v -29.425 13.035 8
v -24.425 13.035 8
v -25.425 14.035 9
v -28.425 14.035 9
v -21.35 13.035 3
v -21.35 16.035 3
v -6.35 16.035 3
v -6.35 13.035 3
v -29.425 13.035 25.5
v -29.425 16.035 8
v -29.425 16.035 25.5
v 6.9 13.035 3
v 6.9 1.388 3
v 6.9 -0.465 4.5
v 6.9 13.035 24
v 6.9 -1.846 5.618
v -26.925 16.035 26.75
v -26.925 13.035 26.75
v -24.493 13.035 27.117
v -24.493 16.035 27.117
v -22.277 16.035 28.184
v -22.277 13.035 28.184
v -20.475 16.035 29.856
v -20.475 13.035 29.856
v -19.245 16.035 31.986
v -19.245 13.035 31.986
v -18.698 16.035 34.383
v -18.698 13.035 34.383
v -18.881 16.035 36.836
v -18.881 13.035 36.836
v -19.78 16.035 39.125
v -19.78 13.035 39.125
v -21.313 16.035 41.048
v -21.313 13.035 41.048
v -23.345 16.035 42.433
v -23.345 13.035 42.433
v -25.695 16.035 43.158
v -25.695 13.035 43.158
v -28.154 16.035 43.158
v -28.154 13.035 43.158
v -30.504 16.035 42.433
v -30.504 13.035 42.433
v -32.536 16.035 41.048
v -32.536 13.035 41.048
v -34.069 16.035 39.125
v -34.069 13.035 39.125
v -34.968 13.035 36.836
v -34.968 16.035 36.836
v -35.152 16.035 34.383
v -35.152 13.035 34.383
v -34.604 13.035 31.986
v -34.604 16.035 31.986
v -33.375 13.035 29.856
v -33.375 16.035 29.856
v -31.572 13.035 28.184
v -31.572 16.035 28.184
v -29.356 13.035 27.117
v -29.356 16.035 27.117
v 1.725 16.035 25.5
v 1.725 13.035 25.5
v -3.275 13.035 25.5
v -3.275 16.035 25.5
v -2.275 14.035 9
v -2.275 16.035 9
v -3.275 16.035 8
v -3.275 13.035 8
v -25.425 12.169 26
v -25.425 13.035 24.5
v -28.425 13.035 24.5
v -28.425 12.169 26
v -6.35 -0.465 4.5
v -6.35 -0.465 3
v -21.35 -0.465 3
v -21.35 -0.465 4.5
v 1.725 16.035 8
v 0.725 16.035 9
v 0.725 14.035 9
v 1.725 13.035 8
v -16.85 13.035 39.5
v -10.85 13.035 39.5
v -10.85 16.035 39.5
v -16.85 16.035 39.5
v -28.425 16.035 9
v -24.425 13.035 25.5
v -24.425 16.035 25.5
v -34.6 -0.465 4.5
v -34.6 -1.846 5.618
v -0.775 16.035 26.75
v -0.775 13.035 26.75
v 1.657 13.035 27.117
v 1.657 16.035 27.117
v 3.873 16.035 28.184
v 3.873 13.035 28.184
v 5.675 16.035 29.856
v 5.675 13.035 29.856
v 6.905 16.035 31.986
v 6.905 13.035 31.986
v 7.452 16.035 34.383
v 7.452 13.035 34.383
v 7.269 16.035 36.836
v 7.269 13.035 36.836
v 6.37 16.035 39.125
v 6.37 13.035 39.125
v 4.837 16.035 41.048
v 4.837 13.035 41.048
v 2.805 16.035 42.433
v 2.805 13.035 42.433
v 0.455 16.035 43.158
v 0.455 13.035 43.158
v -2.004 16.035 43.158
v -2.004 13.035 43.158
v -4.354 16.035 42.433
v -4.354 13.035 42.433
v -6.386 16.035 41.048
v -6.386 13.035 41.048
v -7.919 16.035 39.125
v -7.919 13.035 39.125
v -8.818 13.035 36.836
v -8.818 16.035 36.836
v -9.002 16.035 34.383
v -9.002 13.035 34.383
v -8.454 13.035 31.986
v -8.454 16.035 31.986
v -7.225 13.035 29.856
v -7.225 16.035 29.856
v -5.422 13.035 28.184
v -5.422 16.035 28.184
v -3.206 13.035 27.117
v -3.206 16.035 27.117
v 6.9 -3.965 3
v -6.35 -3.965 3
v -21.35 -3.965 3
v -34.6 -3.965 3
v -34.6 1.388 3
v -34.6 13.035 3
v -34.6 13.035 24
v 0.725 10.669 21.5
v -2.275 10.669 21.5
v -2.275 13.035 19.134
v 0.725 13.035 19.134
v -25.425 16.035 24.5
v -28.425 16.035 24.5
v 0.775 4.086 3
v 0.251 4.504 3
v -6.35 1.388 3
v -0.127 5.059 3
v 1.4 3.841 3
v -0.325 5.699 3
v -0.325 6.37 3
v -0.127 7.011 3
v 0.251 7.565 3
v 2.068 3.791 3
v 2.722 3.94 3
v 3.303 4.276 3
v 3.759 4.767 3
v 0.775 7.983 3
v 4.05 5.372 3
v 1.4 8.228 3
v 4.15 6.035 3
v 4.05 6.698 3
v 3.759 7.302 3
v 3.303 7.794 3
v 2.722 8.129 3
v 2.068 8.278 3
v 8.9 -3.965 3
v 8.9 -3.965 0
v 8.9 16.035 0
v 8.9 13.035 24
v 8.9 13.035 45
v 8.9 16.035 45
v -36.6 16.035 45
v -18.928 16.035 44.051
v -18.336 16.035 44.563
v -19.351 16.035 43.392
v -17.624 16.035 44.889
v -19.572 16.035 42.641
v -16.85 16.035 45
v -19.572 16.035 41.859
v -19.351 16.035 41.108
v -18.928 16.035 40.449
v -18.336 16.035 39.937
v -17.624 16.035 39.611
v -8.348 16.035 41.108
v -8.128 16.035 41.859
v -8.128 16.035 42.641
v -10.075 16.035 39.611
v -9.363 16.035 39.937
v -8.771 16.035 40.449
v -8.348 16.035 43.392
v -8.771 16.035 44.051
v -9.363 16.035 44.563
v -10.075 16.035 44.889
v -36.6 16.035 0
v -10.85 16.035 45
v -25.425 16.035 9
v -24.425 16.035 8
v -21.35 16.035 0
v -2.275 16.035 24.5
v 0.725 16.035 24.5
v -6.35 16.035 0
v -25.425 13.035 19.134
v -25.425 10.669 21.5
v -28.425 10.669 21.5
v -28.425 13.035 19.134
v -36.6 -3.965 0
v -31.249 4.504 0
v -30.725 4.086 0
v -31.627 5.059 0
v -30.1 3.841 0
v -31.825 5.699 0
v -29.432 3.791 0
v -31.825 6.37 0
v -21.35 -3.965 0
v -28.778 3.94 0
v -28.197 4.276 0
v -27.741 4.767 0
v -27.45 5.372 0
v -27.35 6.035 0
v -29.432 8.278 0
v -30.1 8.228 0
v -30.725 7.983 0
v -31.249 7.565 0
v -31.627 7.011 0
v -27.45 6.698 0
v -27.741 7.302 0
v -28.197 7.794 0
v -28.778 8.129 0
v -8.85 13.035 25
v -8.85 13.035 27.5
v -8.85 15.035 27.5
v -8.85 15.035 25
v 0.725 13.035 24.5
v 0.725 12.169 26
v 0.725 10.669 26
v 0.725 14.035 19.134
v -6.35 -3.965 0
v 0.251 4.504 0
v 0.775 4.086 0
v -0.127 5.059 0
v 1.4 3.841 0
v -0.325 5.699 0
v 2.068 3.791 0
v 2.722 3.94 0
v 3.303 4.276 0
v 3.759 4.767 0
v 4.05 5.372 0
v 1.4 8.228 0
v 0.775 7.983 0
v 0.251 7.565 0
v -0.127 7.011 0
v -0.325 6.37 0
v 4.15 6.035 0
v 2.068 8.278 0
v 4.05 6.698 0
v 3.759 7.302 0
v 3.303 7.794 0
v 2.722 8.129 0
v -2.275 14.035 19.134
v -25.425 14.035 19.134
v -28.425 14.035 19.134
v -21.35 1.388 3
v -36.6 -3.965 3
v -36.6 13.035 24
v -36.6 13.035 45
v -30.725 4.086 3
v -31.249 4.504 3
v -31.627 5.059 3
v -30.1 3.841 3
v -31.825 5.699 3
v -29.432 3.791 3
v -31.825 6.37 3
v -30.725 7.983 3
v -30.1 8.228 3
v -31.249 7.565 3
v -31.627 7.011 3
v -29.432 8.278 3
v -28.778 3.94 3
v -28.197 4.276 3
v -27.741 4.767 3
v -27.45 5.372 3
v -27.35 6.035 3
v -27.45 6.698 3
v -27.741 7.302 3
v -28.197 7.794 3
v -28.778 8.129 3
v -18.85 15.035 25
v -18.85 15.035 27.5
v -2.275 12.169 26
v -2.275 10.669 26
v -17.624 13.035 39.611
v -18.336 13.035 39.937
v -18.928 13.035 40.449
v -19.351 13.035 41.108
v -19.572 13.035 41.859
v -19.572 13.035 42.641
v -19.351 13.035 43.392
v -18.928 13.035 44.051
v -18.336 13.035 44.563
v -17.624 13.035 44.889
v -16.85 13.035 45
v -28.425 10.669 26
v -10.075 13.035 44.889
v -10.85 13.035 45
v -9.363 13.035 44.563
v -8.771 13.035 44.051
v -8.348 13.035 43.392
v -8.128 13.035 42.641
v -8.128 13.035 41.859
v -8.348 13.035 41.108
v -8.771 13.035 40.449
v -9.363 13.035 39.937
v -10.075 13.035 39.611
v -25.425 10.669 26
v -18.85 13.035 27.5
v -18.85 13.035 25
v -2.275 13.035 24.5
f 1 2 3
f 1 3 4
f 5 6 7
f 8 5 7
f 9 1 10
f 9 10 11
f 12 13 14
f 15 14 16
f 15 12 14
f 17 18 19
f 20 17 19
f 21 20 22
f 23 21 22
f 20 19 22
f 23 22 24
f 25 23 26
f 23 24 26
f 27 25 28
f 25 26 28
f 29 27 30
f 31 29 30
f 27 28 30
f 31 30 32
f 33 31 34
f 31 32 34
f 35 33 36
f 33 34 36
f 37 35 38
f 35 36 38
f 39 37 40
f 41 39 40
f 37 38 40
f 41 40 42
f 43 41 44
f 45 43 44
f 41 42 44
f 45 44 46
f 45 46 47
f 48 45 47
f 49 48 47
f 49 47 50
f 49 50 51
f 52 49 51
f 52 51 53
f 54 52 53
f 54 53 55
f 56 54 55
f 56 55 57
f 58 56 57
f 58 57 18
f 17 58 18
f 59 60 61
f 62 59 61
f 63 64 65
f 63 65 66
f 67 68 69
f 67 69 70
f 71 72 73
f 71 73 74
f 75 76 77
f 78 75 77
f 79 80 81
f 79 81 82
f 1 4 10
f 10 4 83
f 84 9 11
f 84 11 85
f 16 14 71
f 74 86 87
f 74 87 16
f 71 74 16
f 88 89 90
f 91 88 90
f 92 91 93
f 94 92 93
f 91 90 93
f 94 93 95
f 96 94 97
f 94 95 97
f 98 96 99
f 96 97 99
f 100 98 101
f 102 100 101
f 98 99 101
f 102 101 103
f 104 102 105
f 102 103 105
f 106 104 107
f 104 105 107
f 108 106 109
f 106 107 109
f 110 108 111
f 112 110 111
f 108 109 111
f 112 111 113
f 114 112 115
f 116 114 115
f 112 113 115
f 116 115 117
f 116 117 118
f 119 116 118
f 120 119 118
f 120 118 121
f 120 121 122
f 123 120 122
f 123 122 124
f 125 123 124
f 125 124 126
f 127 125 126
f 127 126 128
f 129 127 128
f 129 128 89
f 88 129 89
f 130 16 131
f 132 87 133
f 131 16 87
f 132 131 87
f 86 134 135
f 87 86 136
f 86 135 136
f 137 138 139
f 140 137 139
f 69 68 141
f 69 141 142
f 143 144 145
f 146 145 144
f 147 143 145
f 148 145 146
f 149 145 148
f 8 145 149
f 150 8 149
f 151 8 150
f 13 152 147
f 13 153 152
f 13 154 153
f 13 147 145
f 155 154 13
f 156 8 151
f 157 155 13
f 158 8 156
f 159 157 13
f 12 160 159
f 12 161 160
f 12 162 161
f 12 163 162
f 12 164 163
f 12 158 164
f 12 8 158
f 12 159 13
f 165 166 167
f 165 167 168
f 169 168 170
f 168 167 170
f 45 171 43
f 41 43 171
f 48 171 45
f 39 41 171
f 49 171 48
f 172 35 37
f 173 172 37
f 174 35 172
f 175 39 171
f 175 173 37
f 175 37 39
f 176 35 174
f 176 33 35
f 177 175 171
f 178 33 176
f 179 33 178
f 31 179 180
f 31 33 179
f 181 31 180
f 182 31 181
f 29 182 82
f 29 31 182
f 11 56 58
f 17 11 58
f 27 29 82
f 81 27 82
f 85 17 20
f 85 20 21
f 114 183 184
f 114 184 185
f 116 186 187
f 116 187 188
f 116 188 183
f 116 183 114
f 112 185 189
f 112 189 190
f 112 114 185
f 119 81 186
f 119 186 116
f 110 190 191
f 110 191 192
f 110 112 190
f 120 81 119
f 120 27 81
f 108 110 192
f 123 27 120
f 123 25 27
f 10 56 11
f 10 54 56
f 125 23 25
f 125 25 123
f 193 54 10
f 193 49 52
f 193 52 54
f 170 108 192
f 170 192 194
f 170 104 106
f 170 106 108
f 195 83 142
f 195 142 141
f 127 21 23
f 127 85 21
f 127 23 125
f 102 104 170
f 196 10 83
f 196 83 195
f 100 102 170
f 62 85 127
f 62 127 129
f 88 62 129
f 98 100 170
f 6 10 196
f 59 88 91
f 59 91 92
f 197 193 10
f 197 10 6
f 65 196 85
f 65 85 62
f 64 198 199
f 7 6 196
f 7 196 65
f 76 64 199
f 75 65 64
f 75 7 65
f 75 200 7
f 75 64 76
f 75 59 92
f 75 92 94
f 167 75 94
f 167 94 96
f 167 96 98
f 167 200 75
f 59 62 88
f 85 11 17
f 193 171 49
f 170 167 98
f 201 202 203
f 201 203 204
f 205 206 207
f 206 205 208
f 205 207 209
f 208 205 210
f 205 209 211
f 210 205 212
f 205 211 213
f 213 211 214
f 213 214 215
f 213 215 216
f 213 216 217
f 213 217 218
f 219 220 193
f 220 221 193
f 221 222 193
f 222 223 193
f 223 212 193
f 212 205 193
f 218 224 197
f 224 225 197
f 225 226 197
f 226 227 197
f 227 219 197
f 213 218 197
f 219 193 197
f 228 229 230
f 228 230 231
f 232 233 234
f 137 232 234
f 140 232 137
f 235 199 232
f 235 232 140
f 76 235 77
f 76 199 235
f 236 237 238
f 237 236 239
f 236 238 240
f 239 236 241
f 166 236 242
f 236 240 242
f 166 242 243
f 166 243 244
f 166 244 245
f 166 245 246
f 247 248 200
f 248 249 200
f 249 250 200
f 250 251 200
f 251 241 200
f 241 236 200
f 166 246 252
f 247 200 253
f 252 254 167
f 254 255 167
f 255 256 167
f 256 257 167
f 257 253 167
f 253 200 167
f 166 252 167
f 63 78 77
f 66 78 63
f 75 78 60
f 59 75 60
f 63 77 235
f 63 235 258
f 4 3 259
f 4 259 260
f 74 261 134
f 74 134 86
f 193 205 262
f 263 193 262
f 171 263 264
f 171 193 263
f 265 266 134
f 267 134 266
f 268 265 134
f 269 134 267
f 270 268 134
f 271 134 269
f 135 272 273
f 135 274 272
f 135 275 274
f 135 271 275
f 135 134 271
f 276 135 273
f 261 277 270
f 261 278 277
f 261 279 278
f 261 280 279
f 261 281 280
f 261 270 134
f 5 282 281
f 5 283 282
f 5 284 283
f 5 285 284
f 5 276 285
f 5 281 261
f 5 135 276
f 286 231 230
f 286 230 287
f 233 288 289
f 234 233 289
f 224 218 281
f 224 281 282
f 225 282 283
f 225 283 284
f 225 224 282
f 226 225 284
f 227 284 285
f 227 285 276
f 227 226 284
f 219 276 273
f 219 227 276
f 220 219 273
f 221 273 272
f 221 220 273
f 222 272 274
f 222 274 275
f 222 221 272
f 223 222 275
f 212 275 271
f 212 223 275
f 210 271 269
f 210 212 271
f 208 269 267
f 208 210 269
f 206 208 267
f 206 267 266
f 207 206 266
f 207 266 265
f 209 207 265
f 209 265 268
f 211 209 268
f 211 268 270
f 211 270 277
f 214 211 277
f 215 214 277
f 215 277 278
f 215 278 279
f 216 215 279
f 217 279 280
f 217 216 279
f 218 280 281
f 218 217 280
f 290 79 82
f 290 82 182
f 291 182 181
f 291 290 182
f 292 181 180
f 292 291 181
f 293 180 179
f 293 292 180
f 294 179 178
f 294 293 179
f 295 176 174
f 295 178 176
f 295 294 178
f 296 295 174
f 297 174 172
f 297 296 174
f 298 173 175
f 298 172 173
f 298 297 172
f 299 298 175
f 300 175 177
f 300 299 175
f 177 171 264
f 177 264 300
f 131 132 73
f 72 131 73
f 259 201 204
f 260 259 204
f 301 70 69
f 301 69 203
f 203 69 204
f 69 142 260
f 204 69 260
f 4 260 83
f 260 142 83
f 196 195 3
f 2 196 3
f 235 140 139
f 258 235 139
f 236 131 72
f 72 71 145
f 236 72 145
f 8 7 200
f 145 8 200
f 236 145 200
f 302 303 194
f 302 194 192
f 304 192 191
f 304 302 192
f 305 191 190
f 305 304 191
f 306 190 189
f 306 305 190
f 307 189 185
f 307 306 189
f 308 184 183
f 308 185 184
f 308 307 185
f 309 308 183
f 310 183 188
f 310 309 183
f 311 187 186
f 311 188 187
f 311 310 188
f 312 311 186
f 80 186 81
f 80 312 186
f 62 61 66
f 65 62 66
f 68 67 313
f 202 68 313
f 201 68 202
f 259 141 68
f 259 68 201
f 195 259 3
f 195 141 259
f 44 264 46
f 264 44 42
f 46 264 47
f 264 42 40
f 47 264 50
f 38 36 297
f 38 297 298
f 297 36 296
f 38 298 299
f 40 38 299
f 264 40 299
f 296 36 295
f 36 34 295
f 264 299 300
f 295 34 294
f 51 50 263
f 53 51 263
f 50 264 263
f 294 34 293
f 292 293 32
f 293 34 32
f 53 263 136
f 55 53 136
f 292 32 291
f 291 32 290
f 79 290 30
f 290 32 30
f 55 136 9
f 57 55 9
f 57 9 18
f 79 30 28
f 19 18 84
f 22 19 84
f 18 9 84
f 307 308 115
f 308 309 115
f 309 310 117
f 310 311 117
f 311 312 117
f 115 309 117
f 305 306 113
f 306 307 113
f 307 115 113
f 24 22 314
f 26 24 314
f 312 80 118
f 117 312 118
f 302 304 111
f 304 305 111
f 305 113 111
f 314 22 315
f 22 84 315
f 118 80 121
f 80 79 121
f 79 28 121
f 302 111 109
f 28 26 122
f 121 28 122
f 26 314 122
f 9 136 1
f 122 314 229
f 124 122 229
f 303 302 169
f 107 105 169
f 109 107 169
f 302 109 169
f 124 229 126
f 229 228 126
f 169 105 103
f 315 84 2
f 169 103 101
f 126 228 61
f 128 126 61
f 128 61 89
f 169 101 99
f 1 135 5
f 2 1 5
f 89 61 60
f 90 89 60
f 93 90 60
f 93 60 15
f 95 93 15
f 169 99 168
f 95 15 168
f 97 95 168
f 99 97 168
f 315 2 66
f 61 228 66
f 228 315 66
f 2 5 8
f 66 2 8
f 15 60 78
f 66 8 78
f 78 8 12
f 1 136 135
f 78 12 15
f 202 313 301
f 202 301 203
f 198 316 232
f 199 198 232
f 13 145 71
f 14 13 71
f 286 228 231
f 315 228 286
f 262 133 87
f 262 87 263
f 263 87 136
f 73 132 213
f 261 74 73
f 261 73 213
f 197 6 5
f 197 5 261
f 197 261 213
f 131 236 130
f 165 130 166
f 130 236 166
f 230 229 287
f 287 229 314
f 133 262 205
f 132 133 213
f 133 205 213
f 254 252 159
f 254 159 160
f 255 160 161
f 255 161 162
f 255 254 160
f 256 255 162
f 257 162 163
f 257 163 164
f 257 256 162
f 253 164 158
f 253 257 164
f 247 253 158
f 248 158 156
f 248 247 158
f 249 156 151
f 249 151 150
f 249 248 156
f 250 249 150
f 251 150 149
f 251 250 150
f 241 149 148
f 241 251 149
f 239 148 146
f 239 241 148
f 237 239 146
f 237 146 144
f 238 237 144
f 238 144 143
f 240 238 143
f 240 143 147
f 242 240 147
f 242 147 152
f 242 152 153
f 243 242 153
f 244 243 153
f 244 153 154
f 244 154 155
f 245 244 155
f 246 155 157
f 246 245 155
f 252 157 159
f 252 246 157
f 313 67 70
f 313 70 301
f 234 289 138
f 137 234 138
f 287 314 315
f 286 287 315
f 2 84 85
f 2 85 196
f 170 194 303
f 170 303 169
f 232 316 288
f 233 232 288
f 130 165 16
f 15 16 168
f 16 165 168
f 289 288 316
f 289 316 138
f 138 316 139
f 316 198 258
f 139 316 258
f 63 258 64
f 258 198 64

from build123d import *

# Parameters (mm, degrees)
SKETCH1_W             = 15.25
SKETCH1_H             = 20
SKETCH1_R             = 2.25
BOSS_EXTRUDE1_DEPTH   = 3
BOSS_EXTRUDE1_2_DEPTH = 3
SKETCH2_W             = 45.5
SKETCH2_H             = 3
BOSS_EXTRUDE2_DEPTH   = 42
SKETCH3_R             = 8.25
CUT_EXTRUDE1_DEPTH    = 61.44447165
BOSS_EXTRUDE3_DEPTH   = 2
LPATTERN1_COUNT       = 2
LPATTERN1_PITCH       = 43.5
CUT_EXTRUDE2_DEPTH    = 61.44447165
BOSS_EXTRUDE4_DEPTH   = 3
CUT_EXTRUDE3_DEPTH    = 61.44447165
SKETCH10_W            = 10
SKETCH10_H            = 2.5
CUT_EXTRUDE4_DEPTH    = 2
BOSS_EXTRUDE5_REACH   = 66.609
SKETCH13_W            = 3
SKETCH13_H            = 11.133974596
CUT_EXTRUDE6_DEPTH    = 1
CHAMFER1_SIZE         = 1
BOSS_EXTRUDE6_DEPTH   = 13.25
CHAMFER2_SIZE         = 1


with BuildPart() as part:
    # Sketch1 → Boss-Extrude1 (new body)
    with BuildSketch(Plane.XY):
        with Locations((-28.974646897, 6.034741944)):
            Rectangle(SKETCH1_W, SKETCH1_H)
        with Locations((-29.599646897, 6.034741944)):
            Circle(SKETCH1_R, mode=Mode.SUBTRACT)
    extrude(amount=BOSS_EXTRUDE1_DEPTH)


with BuildPart() as body_2:
    # Sketch1 → Boss-Extrude1 2 (new body)
    with BuildSketch(Plane.XY):
        with Locations((1.275353103, 6.034741944)):
            Rectangle(SKETCH1_W, SKETCH1_H)
        with Locations((1.900353103, 6.034741944)):
            Circle(SKETCH1_R, mode=Mode.SUBTRACT)
    extrude(amount=BOSS_EXTRUDE1_2_DEPTH)



with BuildPart() as body_3:
    # Sketch2 → Boss-Extrude2 (new body)
    with BuildSketch(Plane.XY.offset(3)):
        with Locations((-13.849646897, 14.534741944)):
            Rectangle(SKETCH2_W, SKETCH2_H)
    extrude(amount=BOSS_EXTRUDE2_DEPTH)

    # Sketch3 → Cut-Extrude1 (cut, through all)
    with BuildSketch(Plane(origin=(0, 13.034741944, 0), x_dir=(-1, 0, 0), z_dir=(0, -1, 0))):
        with Locations(Location((26.924646897, -35, 0), (0, 0, 90))):
            Circle(SKETCH3_R)
        with Locations(Location((0.774646897, -35, 0), (0, 0, 90))):
            Circle(SKETCH3_R)
    extrude(amount=-CUT_EXTRUDE1_DEPTH, mode=Mode.SUBTRACT)


with BuildPart() as body_2_1:
    add(body_2.part)

    add(body_3.part)  # Boss-Extrude3 merges body 3
    # Sketch4 → Boss-Extrude3 (add)
    with BuildSketch(Plane(origin=(8.900353103, 0, 0), x_dir=(0, 0, -1), z_dir=(1, 0, 0))):
        Polygon((-3, -3.965258056), (-24, 13.034741944), (-3, 13.034741944), align=None)
    boss_extrude3 = extrude(amount=-BOSS_EXTRUDE3_DEPTH)


with BuildPart() as part_1:
    add(part.part)

    add(body_2_1.part)  # LPattern1 merges body 2
    # LPattern1: Boss-Extrude3 ×2
    with Locations(*[(-i * LPATTERN1_PITCH, 0, 0) for i in range(1, LPATTERN1_COUNT)]):
        add(boss_extrude3)

    # Sketch5 → Cut-Extrude2 (cut, through all)
    with BuildSketch(Plane(origin=(0, 13.034741944, 0), x_dir=(-1, 0, 0), z_dir=(0, -1, 0))):
        Polygon((29.424646897, -8), (29.424646897, -25.5), (24.424646897, -25.5), (24.424646897, -8), (25.424646897, -8), (25.424646897, -24.5), (28.424646897, -24.5), (28.424646897, -8), align=None)
        Polygon((-0.725353103, -8), (-1.725353103, -8), (-1.725353103, -25.5), (3.274646897, -25.5), (3.274646897, -8), (2.274646897, -8), (2.274646897, -24.5), (-0.725353103, -24.5), align=None)
    extrude(amount=-CUT_EXTRUDE2_DEPTH, mode=Mode.SUBTRACT)

    # Sketch6 → Boss-Extrude4 (add)
    with BuildSketch(Plane(origin=(-25.424646897, 0, 0), x_dir=(0, 0, -1), z_dir=(1, 0, 0))):
        Polygon((-24.5, 13.034741944), (-26, 12.16871654), (-26, 10.66871654), (-21.5, 10.66871654), (-19.133974596, 13.034741944), align=None)
    boss_extrude4 = extrude(amount=-BOSS_EXTRUDE4_DEPTH)

    # Mirror7: Boss-Extrude4 across plane
    add(boss_extrude4.mirror(Plane(origin=(-13.849646897, 13.034741944, 8), x_dir=(0, 0, 1), z_dir=(1, 0, 0))))

    # Sketch9 → Cut-Extrude3 (cut, through all)
    with BuildSketch(Plane(origin=(0, 13.034741944, 0), x_dir=(-1, 0, 0), z_dir=(0, -1, 0))):
        with BuildLine():
            Line((16.849646897, -45), (10.849646897, -45))
            ThreePointArc((10.849646897, -45), (8.099646897, -42.25), (10.849646897, -39.5))
            Line((10.849646897, -39.5), (16.849646897, -39.5))
            ThreePointArc((16.849646897, -39.5), (19.599646897, -42.25), (16.849646897, -45))
        make_face()
    extrude(amount=-CUT_EXTRUDE3_DEPTH, mode=Mode.SUBTRACT)

    # Sketch10 → Cut-Extrude4 (cut)
    with BuildSketch(Plane(origin=(0, 13.034741944, 0), x_dir=(-1, 0, 0), z_dir=(0, -1, 0))):
        with Locations((13.849646897, -26.25)):
            Rectangle(SKETCH10_W, SKETCH10_H)
    extrude(amount=-CUT_EXTRUDE4_DEPTH, mode=Mode.SUBTRACT)

    # Boss-Extrude5: up to this face of the body (flat: up to its plane)
    boss_extrude5_end = Plane(part_1.part.faces().sort_by_distance((6.900353103, 7.368075277, 10))[0])
    # Sketch11 → Boss-Extrude5 (add, up to the picked face)
    with BuildSketch(Plane(origin=(-34.599646897, 0, 0), x_dir=(0, 0, -1), z_dir=(1, 0, 0)), mode=Mode.PRIVATE) as boss_extrude5_sk1:
        Polygon((-5.617808219, -1.846079974), (-3, -3.965258056), (-3, -0.465258056), (-4.5, -0.465258056), align=None)
    boss_extrude5_tool1 = split(extrude(boss_extrude5_sk1.sketch, amount=BOSS_EXTRUDE5_REACH, mode=Mode.PRIVATE), bisect_by=boss_extrude5_end, keep=Keep.BOTH, mode=Mode.PRIVATE)
    add(boss_extrude5_tool1.solids().sort_by(Axis((-34.599647, -1.87709, 3.964792), (1, 0, 0)))[0])

    # Sketch13 → Cut-Extrude6 (cut)
    with BuildSketch(Plane(origin=(0, 13.034741944, 0), x_dir=(-1, 0, 0), z_dir=(0, -1, 0))):
        with Locations((26.924646897, -13.566987298)):
            Rectangle(SKETCH13_W, SKETCH13_H)
        with Locations((0.774646897, -13.566987298)):
            Rectangle(SKETCH13_W, SKETCH13_H)
    extrude(amount=-CUT_EXTRUDE6_DEPTH, mode=Mode.SUBTRACT)

    # Chamfer1
    chamfer1_edges = [part_1.edges().sort_by_distance(p)[0] for p in [
        (-26.924646897, 14.034741944, 8),
        (-0.774646897, 14.034741944, 8),
    ]]
    chamfer(chamfer1_edges, length=CHAMFER1_SIZE - 0.0001)  # a hair under: the kernel refuses the full size

    # Sketch11<3> → Boss-Extrude6 (add)
    with BuildSketch(Plane(origin=(-34.599646897, 0, 0), x_dir=(0, 0, -1), z_dir=(1, 0, 0))):
        Polygon((-4.5, -0.465258056), (-3, -0.465258056), (-3, 1.38768312), align=None)
    boss_extrude6 = extrude(amount=BOSS_EXTRUDE6_DEPTH)

    # Mirror8: Boss-Extrude6 across plane
    add(boss_extrude6.mirror(Plane(origin=(-13.849646897, 13.034741944, 8), x_dir=(0, 0, 1), z_dir=(1, 0, 0))))

    # Chamfer2
    chamfer2_edges = [part_1.edges().sort_by_distance(p)[0] for p in [
        (-28.424646897, 14.534791944, 8),
        (-2.274646897, 14.534791944, 8),
        (-25.424646897, 14.534791944, 8),
        (0.725353103, 14.534791944, 8),
    ]]
    chamfer(chamfer2_edges, length=CHAMFER2_SIZE - 0.0001)  # a hair under: the kernel refuses the full size


solid = part_1.part
